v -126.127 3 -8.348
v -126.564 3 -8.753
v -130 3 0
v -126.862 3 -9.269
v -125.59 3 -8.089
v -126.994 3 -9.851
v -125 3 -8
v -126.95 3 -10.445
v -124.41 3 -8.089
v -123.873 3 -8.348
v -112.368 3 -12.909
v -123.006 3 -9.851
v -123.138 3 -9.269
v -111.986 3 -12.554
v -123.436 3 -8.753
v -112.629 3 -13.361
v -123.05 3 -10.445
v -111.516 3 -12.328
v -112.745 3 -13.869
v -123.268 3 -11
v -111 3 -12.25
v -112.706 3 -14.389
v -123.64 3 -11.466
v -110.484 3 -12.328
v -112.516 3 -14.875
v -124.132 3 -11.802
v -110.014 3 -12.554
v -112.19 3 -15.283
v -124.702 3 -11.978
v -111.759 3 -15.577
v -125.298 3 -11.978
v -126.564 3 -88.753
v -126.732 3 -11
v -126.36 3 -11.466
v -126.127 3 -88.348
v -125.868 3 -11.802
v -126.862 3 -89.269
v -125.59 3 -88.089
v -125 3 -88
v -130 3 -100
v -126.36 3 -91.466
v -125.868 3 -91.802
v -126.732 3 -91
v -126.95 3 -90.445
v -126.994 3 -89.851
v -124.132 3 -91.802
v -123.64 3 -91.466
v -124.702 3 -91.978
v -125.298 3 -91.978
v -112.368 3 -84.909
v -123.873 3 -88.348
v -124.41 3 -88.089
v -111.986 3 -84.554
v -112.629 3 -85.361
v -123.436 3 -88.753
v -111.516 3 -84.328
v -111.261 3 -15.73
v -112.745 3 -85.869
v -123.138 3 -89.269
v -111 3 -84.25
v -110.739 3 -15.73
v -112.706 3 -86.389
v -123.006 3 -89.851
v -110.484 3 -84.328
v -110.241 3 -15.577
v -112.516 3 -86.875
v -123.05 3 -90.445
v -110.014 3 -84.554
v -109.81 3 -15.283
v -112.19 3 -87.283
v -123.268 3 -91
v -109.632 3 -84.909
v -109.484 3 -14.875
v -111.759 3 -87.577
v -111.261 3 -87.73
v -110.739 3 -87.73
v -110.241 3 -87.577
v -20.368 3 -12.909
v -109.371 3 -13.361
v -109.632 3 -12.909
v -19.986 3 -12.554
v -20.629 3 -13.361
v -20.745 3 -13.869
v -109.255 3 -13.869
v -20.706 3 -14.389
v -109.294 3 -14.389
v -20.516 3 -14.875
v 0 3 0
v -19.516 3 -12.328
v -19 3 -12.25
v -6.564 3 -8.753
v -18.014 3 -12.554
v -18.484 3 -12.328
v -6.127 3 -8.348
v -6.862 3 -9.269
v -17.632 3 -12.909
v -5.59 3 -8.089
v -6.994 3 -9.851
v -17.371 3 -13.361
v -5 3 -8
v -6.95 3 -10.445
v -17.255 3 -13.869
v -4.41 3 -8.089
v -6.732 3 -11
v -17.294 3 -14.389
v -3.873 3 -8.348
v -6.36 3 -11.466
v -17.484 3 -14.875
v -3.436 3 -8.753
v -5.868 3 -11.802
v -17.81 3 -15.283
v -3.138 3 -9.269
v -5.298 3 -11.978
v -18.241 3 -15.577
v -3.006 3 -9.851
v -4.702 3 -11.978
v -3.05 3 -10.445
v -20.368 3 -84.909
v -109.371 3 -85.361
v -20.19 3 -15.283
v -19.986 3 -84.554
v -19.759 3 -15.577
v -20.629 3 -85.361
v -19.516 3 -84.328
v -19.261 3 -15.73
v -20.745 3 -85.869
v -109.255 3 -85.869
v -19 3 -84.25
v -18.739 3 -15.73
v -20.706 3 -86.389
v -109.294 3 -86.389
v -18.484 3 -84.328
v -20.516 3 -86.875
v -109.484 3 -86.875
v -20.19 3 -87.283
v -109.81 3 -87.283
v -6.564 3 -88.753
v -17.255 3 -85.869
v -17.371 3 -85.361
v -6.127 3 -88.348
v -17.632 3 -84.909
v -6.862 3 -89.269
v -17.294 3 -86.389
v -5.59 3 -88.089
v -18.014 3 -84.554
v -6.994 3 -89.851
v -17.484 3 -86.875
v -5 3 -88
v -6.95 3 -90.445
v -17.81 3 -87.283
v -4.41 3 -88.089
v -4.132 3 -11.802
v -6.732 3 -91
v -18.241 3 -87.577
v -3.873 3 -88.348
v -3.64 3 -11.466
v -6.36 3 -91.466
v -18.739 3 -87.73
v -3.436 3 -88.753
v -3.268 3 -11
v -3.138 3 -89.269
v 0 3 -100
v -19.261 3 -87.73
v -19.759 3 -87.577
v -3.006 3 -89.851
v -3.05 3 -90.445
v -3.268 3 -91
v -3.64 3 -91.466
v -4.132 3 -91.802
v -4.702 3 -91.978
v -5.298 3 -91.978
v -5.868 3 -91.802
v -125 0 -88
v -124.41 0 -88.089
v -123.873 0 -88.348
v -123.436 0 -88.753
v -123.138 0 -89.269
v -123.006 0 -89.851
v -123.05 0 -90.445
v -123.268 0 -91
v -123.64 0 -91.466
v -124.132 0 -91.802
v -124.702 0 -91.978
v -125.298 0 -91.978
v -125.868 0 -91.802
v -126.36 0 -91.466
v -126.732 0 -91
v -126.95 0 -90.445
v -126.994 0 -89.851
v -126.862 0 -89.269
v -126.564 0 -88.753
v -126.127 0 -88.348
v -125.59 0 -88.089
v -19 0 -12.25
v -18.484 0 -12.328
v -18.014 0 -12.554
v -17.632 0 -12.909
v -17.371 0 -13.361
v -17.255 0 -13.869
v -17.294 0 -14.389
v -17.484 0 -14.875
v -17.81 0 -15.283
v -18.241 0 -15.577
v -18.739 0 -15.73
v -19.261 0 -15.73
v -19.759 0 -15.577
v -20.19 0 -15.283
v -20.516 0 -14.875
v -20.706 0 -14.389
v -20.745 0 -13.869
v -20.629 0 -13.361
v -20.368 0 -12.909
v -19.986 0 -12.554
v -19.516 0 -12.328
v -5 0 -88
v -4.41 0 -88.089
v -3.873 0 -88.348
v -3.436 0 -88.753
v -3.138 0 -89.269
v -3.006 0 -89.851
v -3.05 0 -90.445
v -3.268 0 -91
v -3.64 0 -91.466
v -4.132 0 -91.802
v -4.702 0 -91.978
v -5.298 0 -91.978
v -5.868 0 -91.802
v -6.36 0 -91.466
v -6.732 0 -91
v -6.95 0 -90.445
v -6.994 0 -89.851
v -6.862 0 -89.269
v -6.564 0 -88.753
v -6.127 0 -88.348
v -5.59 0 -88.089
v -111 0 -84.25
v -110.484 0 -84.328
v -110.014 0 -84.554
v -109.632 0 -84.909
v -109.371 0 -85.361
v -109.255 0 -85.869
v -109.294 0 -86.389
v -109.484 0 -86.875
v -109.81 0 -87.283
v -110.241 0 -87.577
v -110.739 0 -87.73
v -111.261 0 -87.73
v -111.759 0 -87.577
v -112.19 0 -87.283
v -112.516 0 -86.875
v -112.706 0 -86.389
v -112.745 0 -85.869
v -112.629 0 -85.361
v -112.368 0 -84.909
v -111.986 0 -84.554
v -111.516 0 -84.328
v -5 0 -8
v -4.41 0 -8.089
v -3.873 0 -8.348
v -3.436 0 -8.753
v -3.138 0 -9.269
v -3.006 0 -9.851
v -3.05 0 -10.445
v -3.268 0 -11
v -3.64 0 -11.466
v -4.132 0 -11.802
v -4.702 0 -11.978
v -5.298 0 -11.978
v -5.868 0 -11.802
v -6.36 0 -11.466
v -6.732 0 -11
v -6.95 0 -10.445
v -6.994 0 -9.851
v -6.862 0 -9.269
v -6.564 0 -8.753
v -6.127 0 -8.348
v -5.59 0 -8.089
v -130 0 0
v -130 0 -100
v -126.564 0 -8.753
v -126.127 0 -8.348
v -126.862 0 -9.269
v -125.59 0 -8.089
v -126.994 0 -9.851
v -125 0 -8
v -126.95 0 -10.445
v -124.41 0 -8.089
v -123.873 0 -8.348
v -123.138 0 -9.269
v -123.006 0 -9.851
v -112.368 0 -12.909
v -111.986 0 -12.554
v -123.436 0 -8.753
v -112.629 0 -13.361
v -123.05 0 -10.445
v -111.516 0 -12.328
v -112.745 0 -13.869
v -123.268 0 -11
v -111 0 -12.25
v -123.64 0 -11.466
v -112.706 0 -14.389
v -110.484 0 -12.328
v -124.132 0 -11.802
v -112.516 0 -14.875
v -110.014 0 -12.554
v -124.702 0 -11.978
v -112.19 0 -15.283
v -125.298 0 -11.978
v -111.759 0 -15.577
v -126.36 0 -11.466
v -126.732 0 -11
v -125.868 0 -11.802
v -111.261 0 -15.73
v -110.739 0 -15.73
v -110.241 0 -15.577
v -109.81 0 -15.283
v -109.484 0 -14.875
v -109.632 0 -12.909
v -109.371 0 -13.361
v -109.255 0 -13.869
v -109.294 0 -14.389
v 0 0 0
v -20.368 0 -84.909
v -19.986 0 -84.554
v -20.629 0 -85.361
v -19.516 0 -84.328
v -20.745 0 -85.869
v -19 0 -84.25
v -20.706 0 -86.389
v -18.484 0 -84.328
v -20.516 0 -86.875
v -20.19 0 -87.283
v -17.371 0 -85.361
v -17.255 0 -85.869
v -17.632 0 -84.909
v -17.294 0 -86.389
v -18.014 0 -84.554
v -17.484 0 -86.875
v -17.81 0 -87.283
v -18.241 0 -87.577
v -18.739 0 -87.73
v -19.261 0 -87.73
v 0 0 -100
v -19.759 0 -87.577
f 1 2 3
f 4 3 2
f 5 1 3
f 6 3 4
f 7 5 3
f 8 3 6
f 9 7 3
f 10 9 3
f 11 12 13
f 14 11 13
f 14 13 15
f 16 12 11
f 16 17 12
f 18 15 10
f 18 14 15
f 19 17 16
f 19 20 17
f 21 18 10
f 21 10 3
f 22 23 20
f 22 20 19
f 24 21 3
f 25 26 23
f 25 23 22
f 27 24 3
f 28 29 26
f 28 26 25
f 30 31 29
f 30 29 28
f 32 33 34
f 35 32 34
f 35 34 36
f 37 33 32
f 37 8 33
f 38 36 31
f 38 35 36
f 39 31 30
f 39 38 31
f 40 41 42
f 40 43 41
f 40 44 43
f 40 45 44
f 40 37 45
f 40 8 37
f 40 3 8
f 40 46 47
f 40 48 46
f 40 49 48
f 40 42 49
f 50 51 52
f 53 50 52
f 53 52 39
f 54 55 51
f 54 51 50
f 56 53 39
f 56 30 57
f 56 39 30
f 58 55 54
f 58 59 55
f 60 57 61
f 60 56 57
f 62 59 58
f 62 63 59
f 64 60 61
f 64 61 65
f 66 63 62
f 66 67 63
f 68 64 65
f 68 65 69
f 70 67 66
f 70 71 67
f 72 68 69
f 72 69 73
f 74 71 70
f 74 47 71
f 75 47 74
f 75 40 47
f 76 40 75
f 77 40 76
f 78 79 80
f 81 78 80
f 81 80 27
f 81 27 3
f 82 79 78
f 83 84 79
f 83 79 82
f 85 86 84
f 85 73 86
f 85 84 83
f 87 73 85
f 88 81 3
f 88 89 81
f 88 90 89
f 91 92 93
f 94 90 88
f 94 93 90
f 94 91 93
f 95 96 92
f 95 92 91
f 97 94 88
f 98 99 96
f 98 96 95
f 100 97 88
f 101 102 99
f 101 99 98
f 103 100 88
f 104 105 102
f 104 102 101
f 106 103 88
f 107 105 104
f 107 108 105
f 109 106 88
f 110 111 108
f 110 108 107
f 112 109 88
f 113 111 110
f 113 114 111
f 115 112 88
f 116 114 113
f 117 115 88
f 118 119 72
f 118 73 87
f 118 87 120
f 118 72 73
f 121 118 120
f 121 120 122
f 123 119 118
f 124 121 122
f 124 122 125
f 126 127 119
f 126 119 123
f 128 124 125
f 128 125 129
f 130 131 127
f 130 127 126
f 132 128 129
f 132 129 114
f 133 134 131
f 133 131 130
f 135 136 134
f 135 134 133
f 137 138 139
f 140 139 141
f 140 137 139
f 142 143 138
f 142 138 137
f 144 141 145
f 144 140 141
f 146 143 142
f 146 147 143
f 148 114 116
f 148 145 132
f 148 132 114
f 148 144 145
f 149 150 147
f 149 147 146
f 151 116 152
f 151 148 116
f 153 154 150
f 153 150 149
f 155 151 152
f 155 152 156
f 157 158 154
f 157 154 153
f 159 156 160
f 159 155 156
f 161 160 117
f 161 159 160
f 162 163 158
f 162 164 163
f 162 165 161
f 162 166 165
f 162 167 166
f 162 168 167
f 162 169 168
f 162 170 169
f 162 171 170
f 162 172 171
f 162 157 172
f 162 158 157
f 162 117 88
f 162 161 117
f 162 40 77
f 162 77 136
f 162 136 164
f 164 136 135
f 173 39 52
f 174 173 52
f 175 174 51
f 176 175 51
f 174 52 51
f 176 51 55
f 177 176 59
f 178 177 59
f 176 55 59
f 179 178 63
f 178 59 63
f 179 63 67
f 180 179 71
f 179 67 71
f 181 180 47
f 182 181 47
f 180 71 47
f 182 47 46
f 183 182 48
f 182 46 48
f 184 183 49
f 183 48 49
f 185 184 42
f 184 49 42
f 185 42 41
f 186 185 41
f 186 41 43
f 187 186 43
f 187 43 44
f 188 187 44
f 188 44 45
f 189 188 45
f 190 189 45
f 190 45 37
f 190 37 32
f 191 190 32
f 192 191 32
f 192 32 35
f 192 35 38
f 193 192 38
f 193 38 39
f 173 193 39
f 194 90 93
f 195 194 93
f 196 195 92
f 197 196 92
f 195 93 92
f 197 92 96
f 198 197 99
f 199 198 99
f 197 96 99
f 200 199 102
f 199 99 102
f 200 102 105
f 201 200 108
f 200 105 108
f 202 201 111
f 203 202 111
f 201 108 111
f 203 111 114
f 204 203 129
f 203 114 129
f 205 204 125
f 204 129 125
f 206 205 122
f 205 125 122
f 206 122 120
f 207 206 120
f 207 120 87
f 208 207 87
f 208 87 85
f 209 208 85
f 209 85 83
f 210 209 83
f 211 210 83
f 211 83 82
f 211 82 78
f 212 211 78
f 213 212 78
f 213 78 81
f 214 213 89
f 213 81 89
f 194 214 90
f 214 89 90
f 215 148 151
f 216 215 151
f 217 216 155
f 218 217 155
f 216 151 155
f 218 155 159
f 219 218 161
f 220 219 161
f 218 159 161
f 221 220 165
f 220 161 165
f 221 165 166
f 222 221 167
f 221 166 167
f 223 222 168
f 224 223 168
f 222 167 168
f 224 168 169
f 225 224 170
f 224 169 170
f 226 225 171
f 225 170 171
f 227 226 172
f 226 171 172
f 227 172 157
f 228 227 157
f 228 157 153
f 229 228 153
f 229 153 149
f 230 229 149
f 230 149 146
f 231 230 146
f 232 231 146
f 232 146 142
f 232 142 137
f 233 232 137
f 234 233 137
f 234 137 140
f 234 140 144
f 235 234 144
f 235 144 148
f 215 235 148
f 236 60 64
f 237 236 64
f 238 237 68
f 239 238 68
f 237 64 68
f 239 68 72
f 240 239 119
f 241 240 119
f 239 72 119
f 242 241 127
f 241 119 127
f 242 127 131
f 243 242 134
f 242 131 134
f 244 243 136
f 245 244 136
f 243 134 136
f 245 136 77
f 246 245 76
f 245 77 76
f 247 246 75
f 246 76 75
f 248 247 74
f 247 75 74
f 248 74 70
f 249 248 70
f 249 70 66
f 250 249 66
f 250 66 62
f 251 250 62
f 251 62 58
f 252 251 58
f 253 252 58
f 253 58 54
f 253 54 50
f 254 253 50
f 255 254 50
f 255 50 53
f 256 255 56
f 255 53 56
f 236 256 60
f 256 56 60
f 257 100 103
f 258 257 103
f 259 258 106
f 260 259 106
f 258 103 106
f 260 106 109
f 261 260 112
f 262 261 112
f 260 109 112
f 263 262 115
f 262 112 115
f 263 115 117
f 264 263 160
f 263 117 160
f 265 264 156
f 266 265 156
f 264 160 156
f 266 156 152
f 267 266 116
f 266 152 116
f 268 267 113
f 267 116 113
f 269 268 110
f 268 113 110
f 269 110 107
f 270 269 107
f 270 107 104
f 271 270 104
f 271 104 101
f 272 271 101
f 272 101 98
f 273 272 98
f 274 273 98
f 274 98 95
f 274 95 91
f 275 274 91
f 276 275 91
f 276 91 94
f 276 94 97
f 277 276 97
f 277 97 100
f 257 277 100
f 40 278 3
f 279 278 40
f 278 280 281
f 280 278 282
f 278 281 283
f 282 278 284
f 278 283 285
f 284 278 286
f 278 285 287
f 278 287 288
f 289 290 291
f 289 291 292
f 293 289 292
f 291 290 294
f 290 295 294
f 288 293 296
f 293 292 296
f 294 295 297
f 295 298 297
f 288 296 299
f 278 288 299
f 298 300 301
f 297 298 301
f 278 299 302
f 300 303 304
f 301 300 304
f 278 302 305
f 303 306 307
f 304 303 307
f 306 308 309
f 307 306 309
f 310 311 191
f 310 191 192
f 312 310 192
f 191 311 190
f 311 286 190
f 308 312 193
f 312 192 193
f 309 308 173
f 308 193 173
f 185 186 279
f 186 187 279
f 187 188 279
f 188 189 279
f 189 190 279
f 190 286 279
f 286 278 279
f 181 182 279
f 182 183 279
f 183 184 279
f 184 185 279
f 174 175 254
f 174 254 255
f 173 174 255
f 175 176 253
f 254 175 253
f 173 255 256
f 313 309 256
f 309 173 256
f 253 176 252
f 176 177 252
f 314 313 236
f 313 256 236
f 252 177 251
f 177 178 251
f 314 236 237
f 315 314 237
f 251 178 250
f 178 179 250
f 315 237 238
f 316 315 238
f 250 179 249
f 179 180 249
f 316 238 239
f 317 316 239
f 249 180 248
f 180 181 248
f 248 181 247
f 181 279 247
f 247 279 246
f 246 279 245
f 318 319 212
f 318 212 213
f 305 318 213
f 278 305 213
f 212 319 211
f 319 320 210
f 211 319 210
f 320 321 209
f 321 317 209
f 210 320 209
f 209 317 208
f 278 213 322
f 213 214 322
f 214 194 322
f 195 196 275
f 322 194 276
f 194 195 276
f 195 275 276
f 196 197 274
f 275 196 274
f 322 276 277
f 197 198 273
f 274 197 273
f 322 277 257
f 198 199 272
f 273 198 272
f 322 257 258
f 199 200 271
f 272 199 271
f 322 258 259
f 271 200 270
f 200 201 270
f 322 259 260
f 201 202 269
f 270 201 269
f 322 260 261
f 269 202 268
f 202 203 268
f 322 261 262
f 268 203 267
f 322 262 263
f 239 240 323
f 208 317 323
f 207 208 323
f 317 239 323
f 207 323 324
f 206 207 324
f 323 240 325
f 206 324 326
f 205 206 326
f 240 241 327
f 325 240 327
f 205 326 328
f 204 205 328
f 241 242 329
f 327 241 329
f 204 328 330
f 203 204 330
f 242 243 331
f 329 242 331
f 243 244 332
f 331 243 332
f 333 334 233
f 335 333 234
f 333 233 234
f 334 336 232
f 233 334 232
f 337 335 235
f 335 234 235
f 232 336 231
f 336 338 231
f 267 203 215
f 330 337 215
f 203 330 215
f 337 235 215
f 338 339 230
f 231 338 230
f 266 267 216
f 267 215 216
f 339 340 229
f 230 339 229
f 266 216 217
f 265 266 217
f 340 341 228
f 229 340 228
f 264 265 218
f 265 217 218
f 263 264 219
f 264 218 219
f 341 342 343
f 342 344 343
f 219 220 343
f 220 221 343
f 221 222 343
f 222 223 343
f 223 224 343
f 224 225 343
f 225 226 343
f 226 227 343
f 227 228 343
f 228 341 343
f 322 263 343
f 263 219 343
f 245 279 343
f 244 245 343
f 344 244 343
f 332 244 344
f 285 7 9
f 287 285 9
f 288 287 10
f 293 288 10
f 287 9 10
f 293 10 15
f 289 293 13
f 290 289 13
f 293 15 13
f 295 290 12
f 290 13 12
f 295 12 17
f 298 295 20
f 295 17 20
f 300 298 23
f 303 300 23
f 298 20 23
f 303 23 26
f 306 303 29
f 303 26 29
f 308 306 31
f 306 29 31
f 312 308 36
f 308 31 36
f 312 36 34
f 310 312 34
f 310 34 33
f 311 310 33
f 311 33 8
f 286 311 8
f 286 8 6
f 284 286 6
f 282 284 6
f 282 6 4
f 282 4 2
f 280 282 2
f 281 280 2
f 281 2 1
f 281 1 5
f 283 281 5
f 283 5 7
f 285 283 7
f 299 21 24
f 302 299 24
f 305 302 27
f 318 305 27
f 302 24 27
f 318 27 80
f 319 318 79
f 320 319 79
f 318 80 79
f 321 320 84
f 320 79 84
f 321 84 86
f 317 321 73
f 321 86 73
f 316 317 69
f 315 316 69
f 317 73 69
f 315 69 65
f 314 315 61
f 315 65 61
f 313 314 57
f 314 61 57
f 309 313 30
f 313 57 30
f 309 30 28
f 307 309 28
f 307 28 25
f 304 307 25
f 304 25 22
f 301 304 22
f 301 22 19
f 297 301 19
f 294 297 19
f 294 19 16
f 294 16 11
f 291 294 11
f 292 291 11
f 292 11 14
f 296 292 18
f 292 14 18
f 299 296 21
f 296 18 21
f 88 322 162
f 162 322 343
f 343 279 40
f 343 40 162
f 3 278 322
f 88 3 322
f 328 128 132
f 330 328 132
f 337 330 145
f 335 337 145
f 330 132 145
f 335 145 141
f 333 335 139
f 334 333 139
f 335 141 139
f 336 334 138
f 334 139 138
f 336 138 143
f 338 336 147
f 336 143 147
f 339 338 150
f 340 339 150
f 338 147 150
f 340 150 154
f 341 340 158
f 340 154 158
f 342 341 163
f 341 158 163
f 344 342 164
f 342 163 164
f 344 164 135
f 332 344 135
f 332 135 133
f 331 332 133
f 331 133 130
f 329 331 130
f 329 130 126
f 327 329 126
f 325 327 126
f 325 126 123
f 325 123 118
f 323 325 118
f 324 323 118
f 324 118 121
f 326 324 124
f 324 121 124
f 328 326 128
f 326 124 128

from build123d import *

# Parameters (mm, degrees)
ESBO_O2_W                = 130
ESBO_O2_H                = 100
RESSALTO_EXTRUS_O1_DEPTH = 3
ESBO_O5_R                = 1.75
CORTE_EXTRUS_O1_DEPTH    = 3
ESBO_O6_R                = 2
CORTE_EXTRUS_O2_DEPTH    = 10
ESBO_O7_R                = 2
CORTE_EXTRUS_O3_DEPTH    = 10
ESBO_O8_R                = 2
CORTE_EXTRUS_O4_DEPTH    = 10


with BuildPart() as part:
    # Esboço2 → Ressalto-extrusão1 (new body)
    with BuildSketch(Plane(origin=(0, 0, 0), x_dir=(1, 0, 0), z_dir=(0, 1, 0))):
        with Locations((-65, 50)):
            Rectangle(ESBO_O2_W, ESBO_O2_H)
    extrude(amount=RESSALTO_EXTRUS_O1_DEPTH)

    # Esboço5 → Corte-extrusão1 (cut)
    with BuildSketch(Plane(origin=(0, 3, 0), x_dir=(1, 0, 0), z_dir=(0, 1, 0))):
        with Locations(Location((-111, 86, 0), (0, 0, 270))):
            Circle(ESBO_O5_R)
        with Locations(Location((-19, 86, 0), (0, 0, 270))):
            Circle(ESBO_O5_R)
        with Locations(Location((-19, 14, 0), (0, 0, 270))):
            Circle(ESBO_O5_R)
        with Locations(Location((-111, 14, 0), (0, 0, 270))):
            Circle(ESBO_O5_R)
    extrude(amount=-CORTE_EXTRUS_O1_DEPTH, mode=Mode.SUBTRACT)

    # Esboço6 → Corte-extrusão2 (cut)
    with BuildSketch(Plane(origin=(0, 3, 0), x_dir=(1, 0, 0), z_dir=(0, 1, 0))):
        with Locations(Location((-5, 90, 0), (0, 0, 270))):
            Circle(ESBO_O6_R)
        with Locations(Location((-125, 90, 0), (0, 0, 270))):
            Circle(ESBO_O6_R)
    extrude(amount=-CORTE_EXTRUS_O2_DEPTH, mode=Mode.SUBTRACT)

    # Esboço7 → Corte-extrusão3 (cut)
    with BuildSketch(Plane(origin=(0, 3, 0), x_dir=(1, 0, 0), z_dir=(0, 1, 0))):
        with Locations(Location((-125, 10, 0), (0, 0, 270))):
            Circle(ESBO_O7_R)
    extrude(amount=-CORTE_EXTRUS_O3_DEPTH, mode=Mode.SUBTRACT)

    # Esboço8 → Corte-extrusão4 (cut)
    with BuildSketch(Plane(origin=(0, 3, 0), x_dir=(1, 0, 0), z_dir=(0, 1, 0))):
        with Locations(Location((-5, 10, 0), (0, 0, 270))):
            Circle(ESBO_O8_R)
    extrude(amount=-CORTE_EXTRUS_O4_DEPTH, mode=Mode.SUBTRACT)


solid = part.part
